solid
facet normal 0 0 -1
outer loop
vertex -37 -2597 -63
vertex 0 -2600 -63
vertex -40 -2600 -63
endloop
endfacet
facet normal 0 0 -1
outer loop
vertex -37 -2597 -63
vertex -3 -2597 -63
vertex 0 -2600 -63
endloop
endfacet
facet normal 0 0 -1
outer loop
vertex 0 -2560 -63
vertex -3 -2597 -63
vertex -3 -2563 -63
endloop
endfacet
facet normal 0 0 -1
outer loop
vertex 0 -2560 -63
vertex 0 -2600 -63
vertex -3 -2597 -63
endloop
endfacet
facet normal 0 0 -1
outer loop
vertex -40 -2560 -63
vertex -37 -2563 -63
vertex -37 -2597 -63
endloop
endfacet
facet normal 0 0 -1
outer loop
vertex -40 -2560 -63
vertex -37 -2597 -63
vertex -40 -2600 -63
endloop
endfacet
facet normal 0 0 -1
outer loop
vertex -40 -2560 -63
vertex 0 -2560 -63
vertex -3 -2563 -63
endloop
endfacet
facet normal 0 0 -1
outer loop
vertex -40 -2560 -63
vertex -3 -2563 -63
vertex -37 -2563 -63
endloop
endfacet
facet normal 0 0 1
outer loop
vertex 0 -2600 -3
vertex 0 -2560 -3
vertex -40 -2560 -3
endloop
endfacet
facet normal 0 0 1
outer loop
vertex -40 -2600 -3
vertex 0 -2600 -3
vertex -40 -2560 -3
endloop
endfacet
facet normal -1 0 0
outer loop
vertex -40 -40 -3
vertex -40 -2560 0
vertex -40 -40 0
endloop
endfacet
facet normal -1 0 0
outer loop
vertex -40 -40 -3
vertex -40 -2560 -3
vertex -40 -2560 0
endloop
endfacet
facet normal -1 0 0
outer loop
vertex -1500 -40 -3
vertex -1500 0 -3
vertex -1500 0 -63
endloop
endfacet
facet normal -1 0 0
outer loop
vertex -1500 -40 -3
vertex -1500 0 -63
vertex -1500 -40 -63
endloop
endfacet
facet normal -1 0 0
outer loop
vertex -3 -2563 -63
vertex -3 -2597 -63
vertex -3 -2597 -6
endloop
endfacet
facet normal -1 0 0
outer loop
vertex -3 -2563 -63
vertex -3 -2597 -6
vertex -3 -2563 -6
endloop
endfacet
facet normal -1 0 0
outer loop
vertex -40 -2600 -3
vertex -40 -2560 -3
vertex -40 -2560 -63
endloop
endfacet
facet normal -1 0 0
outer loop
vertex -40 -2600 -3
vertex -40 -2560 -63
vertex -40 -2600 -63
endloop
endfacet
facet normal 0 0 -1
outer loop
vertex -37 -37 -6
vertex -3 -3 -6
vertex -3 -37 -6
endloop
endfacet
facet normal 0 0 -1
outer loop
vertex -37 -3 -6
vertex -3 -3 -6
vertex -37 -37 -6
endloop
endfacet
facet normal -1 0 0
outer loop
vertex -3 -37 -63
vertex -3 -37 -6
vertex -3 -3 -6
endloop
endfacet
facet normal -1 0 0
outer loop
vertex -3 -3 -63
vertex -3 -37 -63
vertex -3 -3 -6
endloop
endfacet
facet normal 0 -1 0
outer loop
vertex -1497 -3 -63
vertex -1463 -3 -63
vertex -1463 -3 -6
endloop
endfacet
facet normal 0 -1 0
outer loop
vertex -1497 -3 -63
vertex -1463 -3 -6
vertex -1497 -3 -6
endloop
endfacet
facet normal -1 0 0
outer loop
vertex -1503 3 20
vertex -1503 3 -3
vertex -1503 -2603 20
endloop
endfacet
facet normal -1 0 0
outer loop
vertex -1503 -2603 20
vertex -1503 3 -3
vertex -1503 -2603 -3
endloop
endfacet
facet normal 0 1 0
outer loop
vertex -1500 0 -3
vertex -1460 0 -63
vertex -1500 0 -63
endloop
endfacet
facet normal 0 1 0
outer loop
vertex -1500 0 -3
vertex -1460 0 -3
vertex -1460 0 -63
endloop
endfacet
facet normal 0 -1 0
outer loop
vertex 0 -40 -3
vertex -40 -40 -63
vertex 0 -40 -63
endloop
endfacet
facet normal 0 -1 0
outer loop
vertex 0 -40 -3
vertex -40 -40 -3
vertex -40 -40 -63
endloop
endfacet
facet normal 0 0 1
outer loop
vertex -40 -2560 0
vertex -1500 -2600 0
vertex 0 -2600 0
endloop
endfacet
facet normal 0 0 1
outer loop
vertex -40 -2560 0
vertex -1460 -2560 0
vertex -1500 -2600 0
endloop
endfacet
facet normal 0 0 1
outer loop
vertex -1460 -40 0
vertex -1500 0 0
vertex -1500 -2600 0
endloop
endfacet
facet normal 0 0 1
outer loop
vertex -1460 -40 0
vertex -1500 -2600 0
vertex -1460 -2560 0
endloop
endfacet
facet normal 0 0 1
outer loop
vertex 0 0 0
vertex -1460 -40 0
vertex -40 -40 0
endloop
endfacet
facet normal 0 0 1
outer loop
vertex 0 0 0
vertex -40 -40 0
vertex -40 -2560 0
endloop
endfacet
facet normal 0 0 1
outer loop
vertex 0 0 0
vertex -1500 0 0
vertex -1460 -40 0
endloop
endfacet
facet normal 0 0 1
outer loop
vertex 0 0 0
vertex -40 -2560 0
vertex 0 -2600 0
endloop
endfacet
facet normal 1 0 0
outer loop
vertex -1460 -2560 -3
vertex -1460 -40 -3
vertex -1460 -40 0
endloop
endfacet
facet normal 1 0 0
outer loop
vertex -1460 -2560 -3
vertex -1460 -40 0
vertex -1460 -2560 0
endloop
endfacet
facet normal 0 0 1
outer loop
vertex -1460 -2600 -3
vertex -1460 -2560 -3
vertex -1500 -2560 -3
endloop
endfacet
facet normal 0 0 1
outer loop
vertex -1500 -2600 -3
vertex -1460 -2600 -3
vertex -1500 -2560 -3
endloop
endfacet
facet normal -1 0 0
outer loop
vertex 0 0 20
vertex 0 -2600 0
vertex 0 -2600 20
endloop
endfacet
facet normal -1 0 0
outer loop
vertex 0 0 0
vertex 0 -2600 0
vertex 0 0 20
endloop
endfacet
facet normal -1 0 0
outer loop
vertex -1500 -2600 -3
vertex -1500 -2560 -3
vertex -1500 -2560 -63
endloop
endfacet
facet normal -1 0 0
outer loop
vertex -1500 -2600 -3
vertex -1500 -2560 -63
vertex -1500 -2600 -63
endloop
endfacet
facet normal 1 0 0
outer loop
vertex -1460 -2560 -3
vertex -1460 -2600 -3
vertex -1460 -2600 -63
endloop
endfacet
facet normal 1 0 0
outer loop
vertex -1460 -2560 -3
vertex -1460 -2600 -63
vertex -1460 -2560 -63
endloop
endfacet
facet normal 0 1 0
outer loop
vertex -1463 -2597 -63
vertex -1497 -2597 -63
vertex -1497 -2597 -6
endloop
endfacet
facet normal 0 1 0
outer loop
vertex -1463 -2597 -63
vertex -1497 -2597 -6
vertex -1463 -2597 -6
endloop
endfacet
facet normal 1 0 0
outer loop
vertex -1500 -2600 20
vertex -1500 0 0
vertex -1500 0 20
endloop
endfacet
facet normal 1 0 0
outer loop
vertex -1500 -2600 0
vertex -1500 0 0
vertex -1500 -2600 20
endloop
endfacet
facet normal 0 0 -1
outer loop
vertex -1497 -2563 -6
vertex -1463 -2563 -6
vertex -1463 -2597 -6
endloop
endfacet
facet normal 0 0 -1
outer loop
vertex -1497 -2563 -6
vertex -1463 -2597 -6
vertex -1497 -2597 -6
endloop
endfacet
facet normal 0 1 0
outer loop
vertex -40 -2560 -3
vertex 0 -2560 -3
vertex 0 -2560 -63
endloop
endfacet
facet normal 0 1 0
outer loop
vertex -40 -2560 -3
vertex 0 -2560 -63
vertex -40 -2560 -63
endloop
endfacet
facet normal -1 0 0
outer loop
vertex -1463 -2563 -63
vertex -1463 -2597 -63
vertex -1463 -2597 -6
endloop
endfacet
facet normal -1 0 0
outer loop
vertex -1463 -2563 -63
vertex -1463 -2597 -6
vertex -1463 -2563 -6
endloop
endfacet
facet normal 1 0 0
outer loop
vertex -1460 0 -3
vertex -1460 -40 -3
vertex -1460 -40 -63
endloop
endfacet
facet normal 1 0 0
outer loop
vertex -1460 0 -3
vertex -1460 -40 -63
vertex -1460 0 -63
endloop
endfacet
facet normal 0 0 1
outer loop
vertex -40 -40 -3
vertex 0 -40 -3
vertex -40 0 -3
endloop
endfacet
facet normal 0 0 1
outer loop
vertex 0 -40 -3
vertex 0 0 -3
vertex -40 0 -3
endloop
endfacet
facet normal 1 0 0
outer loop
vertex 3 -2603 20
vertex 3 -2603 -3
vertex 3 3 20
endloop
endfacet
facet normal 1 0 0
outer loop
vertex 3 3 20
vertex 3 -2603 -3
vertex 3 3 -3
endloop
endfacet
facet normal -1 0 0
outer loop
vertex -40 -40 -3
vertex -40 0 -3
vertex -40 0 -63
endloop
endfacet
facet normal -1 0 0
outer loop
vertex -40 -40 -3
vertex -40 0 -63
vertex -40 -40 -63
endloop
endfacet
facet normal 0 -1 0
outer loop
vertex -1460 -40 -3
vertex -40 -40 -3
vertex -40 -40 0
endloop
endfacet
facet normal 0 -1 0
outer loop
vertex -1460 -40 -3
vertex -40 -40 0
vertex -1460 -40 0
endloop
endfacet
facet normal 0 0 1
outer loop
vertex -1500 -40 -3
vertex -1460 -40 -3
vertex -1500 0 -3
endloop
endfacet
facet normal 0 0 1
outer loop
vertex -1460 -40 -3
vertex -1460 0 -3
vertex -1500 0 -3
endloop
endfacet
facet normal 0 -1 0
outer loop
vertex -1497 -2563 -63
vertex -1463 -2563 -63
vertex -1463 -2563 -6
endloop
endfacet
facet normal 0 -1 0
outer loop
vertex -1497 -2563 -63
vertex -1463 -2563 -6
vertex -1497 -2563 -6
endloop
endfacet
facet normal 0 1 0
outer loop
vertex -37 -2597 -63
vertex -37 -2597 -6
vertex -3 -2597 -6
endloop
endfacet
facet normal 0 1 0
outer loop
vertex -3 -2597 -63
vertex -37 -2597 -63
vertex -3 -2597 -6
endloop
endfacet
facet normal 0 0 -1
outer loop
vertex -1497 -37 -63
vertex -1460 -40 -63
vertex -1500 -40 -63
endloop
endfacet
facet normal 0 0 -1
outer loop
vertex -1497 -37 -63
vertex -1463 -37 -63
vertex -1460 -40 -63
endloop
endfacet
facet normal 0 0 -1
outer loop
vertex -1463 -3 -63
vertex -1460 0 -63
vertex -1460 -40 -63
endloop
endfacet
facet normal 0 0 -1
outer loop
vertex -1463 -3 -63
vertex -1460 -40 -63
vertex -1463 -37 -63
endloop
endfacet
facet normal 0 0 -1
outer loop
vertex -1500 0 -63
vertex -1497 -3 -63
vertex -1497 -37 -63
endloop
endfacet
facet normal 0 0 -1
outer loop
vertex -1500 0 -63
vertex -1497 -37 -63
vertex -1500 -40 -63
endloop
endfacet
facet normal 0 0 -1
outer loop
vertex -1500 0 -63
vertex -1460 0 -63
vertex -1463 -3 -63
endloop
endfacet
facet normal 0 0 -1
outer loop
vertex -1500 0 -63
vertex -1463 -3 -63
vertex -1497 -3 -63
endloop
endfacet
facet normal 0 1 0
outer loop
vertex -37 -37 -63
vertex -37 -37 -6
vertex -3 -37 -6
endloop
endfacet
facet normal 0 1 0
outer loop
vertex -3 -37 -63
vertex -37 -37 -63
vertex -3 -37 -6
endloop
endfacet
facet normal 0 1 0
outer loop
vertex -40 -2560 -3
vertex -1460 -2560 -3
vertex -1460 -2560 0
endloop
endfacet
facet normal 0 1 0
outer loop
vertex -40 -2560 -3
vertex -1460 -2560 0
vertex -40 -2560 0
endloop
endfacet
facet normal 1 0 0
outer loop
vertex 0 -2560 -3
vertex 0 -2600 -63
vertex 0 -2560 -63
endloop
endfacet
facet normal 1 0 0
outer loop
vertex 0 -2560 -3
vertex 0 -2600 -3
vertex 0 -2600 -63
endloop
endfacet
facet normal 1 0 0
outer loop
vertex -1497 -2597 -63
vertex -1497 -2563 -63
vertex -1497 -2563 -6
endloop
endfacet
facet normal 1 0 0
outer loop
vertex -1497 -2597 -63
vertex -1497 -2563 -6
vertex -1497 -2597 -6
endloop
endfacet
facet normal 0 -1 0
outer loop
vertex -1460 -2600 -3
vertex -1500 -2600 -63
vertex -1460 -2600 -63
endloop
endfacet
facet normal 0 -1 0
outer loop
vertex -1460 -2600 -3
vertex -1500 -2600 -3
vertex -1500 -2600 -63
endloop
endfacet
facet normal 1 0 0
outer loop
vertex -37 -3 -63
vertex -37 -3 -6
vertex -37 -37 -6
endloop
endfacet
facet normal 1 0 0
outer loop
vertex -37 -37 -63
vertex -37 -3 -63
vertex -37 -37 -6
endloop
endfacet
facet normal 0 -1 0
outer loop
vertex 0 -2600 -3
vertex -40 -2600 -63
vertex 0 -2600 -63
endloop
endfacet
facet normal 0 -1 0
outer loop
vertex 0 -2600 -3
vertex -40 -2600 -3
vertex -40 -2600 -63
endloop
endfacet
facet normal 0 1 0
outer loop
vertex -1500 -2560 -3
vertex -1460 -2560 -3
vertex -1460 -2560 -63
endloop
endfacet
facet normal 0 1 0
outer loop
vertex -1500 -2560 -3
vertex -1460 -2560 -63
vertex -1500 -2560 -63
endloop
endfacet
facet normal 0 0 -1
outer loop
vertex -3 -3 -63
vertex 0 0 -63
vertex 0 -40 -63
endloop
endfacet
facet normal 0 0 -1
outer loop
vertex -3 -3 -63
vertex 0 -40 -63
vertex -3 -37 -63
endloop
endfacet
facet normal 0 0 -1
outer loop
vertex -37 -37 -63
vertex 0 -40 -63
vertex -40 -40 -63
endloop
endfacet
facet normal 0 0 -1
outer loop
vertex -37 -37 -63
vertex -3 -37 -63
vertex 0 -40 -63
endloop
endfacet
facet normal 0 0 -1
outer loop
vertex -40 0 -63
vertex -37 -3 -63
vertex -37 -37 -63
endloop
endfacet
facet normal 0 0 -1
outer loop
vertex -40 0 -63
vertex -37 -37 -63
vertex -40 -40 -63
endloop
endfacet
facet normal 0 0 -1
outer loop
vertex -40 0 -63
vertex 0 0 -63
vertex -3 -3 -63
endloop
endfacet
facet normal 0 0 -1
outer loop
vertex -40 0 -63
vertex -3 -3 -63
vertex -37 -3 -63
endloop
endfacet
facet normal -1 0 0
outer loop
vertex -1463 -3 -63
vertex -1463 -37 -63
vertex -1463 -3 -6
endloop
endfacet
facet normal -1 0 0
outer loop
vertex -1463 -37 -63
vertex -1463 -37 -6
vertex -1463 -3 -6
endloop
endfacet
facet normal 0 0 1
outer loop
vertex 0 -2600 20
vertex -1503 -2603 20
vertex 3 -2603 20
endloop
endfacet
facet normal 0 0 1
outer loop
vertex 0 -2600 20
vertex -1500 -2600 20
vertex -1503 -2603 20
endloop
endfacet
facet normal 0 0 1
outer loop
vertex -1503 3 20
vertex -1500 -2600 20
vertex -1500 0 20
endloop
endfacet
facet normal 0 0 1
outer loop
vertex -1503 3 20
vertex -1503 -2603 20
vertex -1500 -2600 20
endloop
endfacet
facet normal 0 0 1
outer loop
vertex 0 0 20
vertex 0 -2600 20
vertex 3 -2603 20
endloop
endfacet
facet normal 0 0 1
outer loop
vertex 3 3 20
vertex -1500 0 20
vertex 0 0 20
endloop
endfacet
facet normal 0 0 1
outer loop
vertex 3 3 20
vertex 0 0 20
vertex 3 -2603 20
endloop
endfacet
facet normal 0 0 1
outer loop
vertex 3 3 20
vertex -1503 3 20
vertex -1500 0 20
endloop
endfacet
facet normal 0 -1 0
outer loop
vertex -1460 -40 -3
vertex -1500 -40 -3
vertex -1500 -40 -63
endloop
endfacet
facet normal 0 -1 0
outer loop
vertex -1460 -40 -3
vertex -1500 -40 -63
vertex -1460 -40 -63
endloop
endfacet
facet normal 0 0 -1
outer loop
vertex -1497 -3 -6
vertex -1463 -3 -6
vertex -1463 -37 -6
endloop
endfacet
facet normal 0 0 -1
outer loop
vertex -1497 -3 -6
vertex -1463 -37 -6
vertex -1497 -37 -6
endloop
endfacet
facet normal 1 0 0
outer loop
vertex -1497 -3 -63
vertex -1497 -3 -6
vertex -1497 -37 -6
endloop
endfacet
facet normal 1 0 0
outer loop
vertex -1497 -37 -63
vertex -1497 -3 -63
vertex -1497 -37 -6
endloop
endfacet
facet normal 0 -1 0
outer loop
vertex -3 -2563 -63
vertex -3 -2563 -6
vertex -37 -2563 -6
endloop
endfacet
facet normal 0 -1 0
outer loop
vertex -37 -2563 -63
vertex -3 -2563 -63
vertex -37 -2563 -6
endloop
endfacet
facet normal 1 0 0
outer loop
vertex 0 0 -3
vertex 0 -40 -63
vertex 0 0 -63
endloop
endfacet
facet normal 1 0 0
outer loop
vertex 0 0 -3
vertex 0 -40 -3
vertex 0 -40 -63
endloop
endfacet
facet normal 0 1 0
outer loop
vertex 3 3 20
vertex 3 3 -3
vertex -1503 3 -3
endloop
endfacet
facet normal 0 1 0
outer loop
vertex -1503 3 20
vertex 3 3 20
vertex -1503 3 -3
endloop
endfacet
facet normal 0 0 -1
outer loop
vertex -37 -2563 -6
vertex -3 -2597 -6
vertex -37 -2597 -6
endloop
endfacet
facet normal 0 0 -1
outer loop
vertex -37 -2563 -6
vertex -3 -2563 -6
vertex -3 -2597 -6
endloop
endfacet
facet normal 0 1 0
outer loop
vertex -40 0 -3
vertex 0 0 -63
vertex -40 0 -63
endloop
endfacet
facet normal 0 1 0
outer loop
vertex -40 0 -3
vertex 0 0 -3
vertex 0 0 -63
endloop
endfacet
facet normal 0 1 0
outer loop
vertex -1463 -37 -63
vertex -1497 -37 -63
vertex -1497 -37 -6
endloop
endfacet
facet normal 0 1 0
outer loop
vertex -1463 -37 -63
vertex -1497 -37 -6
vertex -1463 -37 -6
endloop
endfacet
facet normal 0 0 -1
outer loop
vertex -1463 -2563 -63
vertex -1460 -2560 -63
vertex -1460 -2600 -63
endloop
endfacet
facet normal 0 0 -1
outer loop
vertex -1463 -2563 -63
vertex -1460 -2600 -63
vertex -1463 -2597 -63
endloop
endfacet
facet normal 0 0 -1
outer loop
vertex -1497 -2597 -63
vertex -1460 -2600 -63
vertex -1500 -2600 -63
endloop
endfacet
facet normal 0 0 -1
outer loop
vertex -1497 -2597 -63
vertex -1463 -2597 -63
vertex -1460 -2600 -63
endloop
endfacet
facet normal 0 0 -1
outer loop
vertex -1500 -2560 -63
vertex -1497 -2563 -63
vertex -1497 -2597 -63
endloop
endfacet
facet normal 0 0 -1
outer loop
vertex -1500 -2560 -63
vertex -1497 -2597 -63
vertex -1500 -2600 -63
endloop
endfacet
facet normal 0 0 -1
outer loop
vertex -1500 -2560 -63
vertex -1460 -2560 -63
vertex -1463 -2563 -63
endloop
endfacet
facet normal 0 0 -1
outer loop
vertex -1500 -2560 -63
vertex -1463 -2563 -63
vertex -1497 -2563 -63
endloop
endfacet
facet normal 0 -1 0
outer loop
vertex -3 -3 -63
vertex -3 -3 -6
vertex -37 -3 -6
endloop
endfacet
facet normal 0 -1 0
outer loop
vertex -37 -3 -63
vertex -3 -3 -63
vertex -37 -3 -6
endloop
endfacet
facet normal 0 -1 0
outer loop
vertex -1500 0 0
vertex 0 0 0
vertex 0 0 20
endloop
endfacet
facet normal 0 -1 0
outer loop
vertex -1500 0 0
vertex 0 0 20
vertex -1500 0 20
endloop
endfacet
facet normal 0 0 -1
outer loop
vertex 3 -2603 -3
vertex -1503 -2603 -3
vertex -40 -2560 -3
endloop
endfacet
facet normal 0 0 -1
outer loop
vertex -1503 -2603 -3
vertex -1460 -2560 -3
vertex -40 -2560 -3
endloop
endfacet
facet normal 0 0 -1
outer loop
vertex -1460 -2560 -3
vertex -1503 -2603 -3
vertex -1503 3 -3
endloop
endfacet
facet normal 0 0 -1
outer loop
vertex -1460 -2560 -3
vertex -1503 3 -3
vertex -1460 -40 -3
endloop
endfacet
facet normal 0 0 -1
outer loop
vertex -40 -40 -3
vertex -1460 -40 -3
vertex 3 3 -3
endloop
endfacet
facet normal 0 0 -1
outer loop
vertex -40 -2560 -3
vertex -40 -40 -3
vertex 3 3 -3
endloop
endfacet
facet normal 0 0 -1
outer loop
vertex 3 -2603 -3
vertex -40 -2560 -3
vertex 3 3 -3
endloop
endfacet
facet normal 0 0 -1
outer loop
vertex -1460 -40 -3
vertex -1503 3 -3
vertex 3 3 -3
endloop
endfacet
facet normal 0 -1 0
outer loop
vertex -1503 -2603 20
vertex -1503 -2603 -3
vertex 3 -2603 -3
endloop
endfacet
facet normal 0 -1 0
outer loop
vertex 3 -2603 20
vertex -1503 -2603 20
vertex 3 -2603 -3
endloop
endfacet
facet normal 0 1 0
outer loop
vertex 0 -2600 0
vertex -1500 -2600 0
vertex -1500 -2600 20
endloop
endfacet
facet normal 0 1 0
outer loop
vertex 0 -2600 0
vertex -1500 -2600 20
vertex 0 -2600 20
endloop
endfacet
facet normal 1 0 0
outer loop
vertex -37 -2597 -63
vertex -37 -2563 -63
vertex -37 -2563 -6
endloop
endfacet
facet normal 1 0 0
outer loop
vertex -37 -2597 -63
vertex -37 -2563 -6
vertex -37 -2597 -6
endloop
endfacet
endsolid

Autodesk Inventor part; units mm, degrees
ref_plane "YZ Plane" through (0, 0, 0) normal (1, 0, 0) x (0, 1, 0)
ref_plane "XZ Plane" through (0, 0, 0) normal (0, 1, 0) x (-1, 0, 0)
ref_plane "XY Plane" through (0, 0, 0) normal (0, 0, 1) x (1, 0, 0)
sketch "Sketch1" plane through (0, 0, 0) normal (0, 0, 1) x (1, 0, 0)
  line L0 (0, 0) -> (-1500, 0)
  line L1 (-1500, 0) -> (-1500, -2600)
  line L2 (-1500, -2600) -> (0, -2600)
  line L3 (0, -2600) -> (0, 0)
  line L4 (-40, -40) -> (-1460, -40)
  line L5 (-1460, -40) -> (-1460, -2560)
  line L6 (-1460, -2560) -> (-40, -2560)
  line L7 (-40, -2560) -> (-40, -40)
  dimension "d0" = 1500
  dimension "d1" = 2600
  dimension "d2" = 40
extrude "Extrusion1" add sketch "Sketch1" along normal blind 20
shell "Shell1" thickness 3 outward yes removed faces 5 at (-1486.6667, -880, 20) at (-1460, -1720, 6.6667) at (-40, -880, 6.6667) at (-513.3333, -2560, 13.3333) at (-986.6667, -40, 13.3333)
sketch "Sketch2" plane through (0, 0, -3) normal (0, 0, -1) x (-1, 0, 0)
  line L0 (1503, 3) -> (1503, -2603) projected
  line L1 (-3, 3) -> (1503, 3) projected
  line L2 (-3, -2603) -> (-3, 3) projected
  line L3 (1503, -2603) -> (-3, -2603) projected
  line L4 (40, -40) -> (40, -2560) projected
  line L5 (1460, -40) -> (40, -40) projected
  line L6 (1460, -2560) -> (1460, -40) projected
  line L7 (40, -2560) -> (1460, -2560) projected
  line L8 (1460, -2560) -> (1460, -40) projected
  line L9 (1500, -2600) -> (0, -2600) projected
  line L10 (1460, -2560) -> (1500, -2560)
  line L11 (1500, -2560) -> (1500, -2600)
  line L12 (1500, -2600) -> (1460, -2600)
  line L13 (1460, -2600) -> (1460, -2560)
  line L14 (0, -2600) -> (0, -2560)
  line L15 (40, -2560) -> (40, -2600)
  line L16 (40, -2600) -> (0, -2600)
  line L17 (0, -2560) -> (40, -2560)
  line L18 (1460, -40) -> (1460, 0)
  line L19 (1500, 0) -> (1500, -40)
  line L20 (1500, -40) -> (1460, -40)
  line L21 (1460, 0) -> (1500, 0)
  line L22 (0, -40) -> (0, 0)
  line L23 (40, 0) -> (40, -40)
  line L24 (40, -40) -> (0, -40)
  line L25 (0, 0) -> (40, 0)
  point P0 (0, 0)
  dimension "d8" = 1460
  dimension "d11" = 2560
extrude "Extrusion2" add sketch "Sketch2" along normal blind 60 separate body contours L18 L21 L19 L20 | L24 L22 L25 L23 | L15 L9 L14 L17 | L10 L11 L9 L13
shell "Shell2" thickness 3 removed faces 4 at (-1486.6667, -13.3333, -63) at (-1486.6667, -2573.3333, -63) at (-26.6667, -2573.3333, -63) at (-13.3333, -13.3333, -63) bodies 2
equation "\"d0\" = comprimento"
equation "\"d1\" = largura"
equation "\"comprimento\" = 1500"
equation "\"largura\" = 2600"
properties part number "estruturaMesa"
